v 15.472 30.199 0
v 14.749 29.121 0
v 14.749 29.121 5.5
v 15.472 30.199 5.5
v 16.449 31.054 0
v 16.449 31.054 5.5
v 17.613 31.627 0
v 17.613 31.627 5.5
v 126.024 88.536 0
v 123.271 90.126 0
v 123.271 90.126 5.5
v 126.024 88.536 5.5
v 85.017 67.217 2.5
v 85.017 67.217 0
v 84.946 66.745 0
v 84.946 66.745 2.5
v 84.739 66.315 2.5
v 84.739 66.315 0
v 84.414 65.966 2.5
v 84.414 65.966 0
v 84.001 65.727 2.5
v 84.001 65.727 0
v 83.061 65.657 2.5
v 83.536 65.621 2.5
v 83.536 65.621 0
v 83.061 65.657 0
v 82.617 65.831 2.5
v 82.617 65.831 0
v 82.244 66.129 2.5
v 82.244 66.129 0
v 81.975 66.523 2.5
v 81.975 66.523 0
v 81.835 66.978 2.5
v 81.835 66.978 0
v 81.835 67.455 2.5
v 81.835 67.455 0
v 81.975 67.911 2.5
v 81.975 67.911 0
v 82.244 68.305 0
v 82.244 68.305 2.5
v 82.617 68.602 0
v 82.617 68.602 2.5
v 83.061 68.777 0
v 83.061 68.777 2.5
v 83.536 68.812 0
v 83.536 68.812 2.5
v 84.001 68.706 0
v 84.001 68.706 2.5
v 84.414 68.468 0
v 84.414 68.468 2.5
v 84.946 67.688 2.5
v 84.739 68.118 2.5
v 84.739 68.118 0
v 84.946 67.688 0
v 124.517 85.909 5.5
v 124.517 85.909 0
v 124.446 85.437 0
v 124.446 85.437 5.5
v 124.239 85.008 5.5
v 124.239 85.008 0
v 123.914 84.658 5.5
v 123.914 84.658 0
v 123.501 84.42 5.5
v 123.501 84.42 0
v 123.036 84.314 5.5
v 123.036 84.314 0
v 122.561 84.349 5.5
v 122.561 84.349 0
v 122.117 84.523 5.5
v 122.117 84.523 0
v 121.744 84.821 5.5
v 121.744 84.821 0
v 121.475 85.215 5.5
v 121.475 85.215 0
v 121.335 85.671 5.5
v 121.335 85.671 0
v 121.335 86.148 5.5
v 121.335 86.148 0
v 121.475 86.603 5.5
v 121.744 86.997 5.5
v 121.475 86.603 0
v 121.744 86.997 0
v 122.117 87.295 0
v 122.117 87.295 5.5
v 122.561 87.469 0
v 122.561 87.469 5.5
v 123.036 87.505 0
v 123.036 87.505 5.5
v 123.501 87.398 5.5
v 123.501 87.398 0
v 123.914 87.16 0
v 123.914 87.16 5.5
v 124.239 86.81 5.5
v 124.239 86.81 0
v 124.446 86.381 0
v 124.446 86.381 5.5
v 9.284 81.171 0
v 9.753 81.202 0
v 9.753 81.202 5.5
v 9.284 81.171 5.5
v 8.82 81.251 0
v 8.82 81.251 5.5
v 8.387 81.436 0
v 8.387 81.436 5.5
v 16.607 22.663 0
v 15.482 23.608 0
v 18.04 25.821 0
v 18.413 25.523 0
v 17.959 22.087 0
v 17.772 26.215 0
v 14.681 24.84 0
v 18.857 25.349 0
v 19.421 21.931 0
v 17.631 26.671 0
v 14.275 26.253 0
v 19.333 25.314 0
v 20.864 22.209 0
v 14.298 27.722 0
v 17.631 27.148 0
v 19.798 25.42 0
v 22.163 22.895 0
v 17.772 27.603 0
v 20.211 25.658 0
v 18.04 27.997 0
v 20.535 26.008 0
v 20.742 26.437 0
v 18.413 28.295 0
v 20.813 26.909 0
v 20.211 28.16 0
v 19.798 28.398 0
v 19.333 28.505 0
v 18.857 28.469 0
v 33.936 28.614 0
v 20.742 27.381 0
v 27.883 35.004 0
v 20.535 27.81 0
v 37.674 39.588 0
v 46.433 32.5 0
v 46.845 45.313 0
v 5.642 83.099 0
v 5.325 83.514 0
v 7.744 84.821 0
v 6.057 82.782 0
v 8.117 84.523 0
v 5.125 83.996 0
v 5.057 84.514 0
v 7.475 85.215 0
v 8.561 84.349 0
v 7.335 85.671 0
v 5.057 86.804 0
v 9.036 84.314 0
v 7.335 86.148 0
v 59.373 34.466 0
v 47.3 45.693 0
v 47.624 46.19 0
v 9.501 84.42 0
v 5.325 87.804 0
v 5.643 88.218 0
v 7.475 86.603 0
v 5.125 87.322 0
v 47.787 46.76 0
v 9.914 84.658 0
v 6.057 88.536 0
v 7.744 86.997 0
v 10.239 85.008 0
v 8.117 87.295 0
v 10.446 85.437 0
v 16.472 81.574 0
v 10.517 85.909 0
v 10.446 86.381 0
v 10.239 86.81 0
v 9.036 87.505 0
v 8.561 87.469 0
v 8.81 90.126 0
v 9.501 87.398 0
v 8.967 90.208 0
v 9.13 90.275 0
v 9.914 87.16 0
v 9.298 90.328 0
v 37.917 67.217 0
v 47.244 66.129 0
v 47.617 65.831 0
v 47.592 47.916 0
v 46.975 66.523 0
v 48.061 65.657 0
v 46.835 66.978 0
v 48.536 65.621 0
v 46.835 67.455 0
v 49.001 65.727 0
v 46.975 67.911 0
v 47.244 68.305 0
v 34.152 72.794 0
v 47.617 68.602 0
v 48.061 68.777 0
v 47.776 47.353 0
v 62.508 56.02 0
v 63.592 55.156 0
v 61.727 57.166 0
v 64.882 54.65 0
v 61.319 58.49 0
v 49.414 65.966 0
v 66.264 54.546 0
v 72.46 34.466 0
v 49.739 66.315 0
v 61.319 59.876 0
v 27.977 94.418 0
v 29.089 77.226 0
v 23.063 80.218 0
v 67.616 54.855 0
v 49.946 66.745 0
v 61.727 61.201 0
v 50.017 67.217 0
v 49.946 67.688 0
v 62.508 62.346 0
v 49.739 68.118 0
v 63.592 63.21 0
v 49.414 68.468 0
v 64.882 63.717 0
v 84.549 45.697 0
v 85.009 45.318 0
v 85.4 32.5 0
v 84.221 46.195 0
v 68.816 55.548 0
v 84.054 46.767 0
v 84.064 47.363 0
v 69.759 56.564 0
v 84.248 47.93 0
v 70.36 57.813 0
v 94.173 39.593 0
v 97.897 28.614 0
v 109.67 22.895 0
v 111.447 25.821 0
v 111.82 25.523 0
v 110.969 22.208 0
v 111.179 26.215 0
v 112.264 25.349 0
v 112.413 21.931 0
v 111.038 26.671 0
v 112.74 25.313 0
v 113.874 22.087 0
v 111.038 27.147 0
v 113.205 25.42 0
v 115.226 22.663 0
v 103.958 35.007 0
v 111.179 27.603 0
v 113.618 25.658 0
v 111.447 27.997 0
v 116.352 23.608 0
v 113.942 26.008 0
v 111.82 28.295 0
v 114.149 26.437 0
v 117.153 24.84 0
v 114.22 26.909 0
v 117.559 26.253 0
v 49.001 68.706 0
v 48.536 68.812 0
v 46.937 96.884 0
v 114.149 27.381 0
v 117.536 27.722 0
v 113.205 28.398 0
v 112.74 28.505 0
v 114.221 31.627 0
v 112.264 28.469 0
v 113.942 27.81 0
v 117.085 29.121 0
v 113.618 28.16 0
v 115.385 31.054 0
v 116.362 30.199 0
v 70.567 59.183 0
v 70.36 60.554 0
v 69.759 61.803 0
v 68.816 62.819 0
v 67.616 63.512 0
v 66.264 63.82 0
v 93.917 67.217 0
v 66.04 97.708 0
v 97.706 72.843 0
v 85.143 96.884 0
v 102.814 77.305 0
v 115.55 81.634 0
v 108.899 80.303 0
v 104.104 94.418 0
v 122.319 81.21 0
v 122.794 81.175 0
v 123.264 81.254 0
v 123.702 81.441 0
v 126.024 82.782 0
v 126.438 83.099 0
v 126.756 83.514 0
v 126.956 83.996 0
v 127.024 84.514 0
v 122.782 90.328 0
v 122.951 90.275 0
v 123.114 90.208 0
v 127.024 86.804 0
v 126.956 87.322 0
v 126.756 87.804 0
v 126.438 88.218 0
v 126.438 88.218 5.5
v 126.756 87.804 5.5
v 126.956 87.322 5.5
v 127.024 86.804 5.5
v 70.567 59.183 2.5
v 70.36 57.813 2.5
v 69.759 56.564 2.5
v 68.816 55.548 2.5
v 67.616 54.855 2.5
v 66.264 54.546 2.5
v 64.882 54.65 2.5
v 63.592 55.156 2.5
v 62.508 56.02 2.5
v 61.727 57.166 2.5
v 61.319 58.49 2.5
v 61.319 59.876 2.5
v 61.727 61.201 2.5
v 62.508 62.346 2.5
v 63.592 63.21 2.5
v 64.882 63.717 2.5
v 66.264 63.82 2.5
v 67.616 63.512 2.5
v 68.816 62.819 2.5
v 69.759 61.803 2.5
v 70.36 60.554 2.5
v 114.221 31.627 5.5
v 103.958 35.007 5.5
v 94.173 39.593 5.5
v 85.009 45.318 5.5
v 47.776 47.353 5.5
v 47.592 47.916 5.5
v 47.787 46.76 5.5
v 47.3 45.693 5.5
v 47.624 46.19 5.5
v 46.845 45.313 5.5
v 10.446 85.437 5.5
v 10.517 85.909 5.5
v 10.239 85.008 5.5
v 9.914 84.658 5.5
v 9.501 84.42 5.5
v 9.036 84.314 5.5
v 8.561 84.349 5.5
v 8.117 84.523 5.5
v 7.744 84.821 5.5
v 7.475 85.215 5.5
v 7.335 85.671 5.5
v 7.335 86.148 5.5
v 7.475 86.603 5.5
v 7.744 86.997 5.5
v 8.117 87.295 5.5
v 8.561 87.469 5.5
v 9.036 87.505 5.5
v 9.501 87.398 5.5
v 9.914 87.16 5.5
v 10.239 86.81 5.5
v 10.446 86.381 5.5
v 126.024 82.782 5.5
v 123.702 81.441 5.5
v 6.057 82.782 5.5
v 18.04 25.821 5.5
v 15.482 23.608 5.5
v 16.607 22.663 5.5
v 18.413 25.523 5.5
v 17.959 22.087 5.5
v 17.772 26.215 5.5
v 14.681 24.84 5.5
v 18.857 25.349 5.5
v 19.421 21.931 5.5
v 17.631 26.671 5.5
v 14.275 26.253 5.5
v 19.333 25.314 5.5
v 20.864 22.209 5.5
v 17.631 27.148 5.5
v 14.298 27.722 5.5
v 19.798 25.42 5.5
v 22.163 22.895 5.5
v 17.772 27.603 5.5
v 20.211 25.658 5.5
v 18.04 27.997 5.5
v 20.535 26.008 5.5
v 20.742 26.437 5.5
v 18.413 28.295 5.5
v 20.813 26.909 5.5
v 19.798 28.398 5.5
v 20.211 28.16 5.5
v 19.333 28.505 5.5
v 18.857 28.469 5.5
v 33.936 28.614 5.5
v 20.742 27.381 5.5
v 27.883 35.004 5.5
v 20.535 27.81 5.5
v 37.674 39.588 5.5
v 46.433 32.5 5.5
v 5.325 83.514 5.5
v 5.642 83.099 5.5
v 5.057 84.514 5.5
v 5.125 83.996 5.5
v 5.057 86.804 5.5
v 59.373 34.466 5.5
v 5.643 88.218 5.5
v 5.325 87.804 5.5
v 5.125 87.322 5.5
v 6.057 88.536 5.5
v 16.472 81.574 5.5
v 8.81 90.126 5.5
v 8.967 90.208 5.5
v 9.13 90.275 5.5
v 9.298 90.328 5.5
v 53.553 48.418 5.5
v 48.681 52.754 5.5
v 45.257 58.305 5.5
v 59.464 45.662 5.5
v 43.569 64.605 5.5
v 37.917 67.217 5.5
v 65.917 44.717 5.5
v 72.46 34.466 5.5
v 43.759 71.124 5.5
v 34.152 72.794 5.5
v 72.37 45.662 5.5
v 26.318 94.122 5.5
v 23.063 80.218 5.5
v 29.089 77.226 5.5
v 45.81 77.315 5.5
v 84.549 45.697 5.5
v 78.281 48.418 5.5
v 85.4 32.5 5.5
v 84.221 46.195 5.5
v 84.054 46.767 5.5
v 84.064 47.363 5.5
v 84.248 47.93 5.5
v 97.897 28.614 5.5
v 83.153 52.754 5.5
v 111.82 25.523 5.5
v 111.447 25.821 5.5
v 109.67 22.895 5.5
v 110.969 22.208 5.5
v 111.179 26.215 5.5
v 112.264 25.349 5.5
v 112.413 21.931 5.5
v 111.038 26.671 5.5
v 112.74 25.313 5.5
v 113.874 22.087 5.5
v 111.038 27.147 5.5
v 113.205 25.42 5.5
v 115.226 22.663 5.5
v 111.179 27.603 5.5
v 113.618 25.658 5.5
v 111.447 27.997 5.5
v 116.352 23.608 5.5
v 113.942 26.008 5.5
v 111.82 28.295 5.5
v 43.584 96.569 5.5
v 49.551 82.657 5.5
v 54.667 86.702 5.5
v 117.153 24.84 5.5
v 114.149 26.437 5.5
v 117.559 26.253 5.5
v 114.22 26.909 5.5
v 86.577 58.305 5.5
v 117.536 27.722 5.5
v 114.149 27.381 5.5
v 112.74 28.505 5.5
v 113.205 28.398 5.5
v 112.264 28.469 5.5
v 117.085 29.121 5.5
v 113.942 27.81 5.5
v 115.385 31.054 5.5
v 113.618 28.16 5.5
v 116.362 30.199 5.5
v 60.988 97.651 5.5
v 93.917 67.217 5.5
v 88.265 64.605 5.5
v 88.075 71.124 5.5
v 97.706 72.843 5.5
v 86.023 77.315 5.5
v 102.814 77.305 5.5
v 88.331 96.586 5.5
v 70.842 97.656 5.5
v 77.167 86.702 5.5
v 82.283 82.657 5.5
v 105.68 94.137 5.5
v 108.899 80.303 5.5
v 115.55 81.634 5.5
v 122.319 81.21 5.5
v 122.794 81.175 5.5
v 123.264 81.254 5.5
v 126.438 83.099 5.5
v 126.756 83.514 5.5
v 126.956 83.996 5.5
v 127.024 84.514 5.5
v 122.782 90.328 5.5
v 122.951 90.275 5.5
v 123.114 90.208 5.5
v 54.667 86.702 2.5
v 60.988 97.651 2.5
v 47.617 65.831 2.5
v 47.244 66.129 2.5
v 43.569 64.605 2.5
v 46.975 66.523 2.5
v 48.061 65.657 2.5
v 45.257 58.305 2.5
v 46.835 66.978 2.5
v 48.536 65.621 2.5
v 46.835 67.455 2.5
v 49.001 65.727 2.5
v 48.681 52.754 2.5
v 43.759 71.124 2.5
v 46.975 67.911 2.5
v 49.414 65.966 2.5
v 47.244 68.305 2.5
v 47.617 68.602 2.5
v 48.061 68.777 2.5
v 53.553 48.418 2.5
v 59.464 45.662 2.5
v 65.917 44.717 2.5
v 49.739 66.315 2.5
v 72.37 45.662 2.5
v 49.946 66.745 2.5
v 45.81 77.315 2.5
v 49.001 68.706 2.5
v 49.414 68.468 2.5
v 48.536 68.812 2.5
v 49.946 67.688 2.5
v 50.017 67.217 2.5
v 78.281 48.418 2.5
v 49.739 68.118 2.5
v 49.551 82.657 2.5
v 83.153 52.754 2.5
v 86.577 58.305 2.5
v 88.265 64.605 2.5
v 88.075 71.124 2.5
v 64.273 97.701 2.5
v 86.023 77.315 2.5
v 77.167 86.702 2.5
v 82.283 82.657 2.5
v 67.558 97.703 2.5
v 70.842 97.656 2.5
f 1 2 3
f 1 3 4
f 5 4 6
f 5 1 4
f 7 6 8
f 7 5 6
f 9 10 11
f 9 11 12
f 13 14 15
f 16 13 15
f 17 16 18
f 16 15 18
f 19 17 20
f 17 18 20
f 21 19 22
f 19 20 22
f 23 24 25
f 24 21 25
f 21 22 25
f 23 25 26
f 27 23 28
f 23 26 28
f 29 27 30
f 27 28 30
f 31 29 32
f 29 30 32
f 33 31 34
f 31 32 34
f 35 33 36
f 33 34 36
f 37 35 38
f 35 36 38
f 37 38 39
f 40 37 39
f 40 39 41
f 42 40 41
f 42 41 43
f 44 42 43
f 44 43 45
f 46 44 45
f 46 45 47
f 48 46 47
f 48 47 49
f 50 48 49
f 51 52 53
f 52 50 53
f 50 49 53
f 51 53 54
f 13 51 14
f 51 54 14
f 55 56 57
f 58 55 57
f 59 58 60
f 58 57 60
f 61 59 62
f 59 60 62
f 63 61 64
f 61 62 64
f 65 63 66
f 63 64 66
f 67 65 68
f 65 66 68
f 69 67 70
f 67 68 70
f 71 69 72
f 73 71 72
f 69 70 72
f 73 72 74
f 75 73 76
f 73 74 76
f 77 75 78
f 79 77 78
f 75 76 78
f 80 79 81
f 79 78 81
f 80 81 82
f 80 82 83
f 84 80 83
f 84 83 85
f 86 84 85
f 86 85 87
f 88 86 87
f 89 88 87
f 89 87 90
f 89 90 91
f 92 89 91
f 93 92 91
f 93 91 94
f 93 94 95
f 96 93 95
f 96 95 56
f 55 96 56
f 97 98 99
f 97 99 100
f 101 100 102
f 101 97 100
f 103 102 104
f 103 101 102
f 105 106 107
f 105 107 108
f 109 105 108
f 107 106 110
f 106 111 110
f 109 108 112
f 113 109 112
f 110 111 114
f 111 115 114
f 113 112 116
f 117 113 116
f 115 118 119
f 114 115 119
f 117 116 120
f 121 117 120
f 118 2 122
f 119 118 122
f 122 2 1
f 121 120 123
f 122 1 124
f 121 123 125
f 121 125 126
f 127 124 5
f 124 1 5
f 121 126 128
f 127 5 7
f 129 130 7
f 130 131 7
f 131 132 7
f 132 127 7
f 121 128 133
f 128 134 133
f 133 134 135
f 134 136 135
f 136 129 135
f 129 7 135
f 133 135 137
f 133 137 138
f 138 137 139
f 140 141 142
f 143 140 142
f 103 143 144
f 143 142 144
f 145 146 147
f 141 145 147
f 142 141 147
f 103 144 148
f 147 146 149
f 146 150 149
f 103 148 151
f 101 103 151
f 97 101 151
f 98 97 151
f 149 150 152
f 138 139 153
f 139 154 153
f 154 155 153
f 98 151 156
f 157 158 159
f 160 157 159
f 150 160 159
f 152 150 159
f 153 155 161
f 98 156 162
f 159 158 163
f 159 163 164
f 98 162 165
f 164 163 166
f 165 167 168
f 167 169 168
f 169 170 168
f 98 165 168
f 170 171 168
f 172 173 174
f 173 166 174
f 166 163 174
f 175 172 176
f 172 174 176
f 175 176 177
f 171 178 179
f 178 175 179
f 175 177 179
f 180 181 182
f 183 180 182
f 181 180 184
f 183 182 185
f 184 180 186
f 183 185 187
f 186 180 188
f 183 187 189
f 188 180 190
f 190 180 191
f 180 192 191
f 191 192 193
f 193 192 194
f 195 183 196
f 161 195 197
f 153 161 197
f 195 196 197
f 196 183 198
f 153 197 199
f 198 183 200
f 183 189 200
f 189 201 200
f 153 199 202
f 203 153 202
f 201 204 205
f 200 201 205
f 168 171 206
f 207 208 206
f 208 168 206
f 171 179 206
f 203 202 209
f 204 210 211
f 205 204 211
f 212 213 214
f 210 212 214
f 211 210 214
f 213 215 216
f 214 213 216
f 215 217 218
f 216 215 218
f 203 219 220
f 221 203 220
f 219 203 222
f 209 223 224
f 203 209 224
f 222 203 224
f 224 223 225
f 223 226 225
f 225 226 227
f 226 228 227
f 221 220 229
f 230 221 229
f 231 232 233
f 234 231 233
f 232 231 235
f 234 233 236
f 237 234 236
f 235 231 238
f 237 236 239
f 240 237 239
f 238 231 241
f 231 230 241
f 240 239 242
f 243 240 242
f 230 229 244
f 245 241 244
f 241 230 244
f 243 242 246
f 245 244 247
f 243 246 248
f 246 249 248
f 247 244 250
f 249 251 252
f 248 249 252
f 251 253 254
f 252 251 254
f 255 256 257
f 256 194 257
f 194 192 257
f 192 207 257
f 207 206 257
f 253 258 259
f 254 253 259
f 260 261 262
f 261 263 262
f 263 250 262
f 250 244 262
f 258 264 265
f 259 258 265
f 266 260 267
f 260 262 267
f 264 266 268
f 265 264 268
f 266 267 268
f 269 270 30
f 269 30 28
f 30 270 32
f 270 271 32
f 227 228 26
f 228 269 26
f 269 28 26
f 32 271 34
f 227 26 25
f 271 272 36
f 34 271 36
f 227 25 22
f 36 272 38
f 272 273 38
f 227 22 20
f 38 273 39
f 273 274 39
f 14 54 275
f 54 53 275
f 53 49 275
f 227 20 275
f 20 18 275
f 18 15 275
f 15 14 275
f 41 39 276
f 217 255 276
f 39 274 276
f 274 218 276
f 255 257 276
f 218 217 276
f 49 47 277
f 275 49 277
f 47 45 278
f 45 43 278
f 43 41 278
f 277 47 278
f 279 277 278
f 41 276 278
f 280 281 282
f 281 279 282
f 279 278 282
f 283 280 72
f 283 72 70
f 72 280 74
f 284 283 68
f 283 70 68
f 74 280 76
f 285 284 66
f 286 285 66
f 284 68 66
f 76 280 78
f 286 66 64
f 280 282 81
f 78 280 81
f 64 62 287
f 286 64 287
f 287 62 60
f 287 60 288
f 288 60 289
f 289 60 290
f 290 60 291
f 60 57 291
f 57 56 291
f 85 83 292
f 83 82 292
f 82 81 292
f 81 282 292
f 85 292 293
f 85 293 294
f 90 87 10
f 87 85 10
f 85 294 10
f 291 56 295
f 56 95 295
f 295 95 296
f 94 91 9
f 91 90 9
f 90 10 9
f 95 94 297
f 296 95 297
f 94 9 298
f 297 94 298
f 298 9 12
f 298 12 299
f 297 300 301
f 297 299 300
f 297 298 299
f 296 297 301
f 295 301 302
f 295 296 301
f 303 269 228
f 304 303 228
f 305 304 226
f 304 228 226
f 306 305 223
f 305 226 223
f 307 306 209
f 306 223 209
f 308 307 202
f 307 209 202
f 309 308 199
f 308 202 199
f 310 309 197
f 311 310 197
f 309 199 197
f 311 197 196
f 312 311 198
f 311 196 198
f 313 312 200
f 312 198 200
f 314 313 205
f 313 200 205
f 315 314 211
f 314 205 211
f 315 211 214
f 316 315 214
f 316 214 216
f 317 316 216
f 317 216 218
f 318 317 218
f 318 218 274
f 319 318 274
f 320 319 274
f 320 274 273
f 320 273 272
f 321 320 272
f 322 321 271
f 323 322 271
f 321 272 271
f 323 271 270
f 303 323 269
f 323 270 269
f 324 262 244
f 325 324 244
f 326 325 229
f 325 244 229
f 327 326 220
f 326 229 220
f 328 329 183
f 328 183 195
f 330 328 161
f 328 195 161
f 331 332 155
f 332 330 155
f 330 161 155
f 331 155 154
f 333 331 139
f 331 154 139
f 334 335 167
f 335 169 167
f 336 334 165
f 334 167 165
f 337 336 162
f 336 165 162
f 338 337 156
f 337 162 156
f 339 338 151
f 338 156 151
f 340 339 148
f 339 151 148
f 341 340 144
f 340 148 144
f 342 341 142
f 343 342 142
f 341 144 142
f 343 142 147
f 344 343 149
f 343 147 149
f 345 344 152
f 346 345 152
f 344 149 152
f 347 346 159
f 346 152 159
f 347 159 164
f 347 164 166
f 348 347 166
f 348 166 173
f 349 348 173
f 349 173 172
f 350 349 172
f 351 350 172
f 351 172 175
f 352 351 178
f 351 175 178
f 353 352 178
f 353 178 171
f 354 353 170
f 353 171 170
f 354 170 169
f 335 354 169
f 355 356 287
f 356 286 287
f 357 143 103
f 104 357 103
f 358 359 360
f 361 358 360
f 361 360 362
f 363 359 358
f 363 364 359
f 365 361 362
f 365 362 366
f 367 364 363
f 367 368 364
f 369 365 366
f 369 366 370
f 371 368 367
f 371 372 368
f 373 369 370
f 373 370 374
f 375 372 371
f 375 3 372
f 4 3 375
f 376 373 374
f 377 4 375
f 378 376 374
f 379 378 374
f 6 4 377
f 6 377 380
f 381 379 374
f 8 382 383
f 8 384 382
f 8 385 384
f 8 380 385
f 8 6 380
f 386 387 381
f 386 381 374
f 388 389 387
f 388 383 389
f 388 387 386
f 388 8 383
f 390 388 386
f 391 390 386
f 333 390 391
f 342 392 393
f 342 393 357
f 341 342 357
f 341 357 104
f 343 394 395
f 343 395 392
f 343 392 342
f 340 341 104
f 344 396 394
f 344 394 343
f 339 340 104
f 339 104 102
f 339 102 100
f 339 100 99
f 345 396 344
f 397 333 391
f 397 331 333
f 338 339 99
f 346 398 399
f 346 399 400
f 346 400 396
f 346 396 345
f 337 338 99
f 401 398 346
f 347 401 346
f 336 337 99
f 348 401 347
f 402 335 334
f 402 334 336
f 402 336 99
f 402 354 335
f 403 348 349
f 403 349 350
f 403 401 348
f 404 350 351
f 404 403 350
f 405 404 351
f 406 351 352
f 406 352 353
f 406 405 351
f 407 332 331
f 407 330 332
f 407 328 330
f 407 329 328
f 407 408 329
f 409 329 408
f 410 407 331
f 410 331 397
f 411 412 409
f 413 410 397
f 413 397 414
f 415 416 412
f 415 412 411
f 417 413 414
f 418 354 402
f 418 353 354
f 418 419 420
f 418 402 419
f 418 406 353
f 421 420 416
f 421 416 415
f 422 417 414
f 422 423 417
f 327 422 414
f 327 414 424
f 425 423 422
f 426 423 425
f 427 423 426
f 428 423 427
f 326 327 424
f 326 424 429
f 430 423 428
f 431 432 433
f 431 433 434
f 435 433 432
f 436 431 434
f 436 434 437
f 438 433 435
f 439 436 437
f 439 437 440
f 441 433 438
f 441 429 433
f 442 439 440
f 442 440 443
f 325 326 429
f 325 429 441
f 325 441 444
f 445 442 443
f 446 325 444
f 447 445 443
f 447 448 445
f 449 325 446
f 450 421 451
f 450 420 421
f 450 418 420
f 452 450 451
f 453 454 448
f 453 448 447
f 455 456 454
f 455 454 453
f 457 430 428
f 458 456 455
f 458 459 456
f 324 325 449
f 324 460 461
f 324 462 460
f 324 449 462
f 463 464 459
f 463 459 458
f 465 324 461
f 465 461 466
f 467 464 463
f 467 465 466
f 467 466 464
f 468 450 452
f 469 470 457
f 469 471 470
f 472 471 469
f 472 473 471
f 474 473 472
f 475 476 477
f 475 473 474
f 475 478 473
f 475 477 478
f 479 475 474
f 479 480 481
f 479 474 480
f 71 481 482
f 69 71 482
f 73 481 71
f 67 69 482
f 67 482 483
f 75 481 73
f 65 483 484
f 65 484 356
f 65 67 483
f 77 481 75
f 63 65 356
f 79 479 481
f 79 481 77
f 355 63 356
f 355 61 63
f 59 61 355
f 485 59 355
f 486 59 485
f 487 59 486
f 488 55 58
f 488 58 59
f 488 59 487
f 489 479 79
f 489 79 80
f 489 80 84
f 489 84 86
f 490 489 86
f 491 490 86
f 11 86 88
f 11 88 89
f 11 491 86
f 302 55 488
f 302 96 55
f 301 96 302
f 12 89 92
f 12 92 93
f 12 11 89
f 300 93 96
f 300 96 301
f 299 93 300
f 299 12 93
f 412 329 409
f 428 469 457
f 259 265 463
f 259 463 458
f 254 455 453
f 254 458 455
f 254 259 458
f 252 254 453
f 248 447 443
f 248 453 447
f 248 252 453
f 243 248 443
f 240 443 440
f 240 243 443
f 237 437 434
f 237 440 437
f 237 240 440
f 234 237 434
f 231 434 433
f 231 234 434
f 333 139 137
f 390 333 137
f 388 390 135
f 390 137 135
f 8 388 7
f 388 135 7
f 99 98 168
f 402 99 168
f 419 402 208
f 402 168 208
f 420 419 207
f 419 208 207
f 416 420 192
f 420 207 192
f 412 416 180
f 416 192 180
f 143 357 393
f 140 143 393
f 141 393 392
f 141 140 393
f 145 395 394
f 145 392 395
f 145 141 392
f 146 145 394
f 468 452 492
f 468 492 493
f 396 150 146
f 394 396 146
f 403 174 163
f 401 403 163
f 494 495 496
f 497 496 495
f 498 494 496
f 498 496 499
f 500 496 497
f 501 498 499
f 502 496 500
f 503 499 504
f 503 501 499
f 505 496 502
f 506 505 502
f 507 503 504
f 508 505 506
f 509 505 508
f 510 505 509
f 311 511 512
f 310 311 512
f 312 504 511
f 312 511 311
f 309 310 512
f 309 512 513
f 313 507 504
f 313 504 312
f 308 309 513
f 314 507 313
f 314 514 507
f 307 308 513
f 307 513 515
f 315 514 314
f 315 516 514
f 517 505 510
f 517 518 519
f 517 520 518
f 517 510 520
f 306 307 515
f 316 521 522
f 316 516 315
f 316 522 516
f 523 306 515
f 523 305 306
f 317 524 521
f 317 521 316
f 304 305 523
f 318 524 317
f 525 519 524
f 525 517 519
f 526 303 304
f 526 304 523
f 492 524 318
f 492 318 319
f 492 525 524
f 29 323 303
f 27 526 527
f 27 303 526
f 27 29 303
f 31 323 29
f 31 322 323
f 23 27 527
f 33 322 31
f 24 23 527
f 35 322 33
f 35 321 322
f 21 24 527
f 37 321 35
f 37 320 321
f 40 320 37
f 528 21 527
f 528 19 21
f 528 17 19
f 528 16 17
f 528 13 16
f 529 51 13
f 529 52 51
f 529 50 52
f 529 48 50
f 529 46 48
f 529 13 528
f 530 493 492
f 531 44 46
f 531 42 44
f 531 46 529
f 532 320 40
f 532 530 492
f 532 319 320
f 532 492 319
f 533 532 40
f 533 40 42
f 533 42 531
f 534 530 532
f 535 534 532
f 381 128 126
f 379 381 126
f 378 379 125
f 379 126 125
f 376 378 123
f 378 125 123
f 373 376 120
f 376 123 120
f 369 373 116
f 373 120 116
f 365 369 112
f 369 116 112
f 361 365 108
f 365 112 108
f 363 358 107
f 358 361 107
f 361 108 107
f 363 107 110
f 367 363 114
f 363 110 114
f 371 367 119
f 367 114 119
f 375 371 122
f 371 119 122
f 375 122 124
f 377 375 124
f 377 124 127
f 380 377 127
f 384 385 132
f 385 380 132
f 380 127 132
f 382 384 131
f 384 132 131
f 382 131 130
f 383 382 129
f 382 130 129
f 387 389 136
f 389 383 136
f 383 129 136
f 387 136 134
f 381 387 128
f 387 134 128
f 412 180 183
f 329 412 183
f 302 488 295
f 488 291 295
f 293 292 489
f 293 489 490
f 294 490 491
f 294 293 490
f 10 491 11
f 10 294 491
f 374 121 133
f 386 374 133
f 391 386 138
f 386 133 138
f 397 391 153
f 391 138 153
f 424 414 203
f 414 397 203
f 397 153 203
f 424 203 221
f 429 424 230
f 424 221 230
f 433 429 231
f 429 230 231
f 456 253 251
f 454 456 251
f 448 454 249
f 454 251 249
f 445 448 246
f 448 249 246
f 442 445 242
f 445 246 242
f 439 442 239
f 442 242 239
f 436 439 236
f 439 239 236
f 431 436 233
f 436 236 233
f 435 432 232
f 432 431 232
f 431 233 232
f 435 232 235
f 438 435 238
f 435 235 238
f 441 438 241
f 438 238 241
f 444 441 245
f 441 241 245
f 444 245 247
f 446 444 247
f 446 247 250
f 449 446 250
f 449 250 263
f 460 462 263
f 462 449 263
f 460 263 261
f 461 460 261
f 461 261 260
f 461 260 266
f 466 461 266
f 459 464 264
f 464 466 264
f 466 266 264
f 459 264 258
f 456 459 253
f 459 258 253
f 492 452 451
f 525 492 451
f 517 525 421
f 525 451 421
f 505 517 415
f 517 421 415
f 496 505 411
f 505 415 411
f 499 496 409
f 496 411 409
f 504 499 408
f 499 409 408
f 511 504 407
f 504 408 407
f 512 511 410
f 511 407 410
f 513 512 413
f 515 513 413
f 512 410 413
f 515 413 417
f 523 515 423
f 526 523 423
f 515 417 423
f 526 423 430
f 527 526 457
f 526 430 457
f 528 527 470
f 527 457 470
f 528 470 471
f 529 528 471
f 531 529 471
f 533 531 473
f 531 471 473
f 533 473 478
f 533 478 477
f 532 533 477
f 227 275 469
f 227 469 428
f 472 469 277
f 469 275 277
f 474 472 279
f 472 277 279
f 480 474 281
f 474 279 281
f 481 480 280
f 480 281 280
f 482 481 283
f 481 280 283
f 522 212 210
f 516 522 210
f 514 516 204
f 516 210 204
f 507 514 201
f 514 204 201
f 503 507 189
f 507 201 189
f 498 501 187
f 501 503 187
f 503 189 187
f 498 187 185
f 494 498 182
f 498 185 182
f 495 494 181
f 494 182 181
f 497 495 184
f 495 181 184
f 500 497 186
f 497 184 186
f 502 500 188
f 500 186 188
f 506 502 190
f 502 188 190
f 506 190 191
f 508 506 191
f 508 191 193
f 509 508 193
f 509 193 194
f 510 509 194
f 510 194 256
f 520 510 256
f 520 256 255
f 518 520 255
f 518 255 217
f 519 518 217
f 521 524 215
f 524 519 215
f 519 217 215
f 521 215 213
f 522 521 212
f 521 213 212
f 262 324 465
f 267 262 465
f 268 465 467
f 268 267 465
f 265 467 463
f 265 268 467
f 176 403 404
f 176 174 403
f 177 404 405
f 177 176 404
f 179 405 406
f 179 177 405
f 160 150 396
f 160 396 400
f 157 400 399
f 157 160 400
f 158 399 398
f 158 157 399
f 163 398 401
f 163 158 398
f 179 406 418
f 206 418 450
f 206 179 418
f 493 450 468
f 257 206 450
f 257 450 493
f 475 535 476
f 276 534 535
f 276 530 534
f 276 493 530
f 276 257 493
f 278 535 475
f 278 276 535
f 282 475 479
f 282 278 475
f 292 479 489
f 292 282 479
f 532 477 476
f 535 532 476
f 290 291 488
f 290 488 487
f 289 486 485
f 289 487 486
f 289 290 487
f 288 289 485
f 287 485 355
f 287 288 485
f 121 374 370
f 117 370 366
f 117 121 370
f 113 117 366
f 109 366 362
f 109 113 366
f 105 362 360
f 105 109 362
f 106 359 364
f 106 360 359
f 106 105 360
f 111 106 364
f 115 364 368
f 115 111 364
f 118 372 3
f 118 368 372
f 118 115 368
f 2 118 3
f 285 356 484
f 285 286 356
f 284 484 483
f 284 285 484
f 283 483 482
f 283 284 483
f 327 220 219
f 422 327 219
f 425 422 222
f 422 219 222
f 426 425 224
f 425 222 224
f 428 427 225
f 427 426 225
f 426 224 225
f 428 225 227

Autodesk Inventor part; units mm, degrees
ref_plane "YZ Plane" through (0, 0, 0) normal (1, 0, 0) x (0, 1, 0)
ref_plane "XZ Plane" through (0, 0, 0) normal (0, 1, 0) x (-1, 0, 0)
ref_plane "XY Plane" through (0, 0, 0) normal (0, 0, 1) x (1, 0, 0)
sketch "スケッチ1" plane through (0, 0, 0) normal (0, 0, 1) x (1, 0, 0)
  circle A0 centre (19.2131, 26.9091) radius 1.6
  circle A1 centre (8.9167, 85.9091) radius 1.6
  circle A2 centre (122.9167, 85.9091) radius 1.6
  circle A3 centre (112.6203, 26.909) radius 1.6
  line L0 (65.9168, 92.271) -> (65.9166, 46.271)
  line L1 (7.2067, 85.9091) -> (10.6267, 85.9091)
  line L2 (8.9167, 84.1991) -> (8.9167, 87.6191)
  line L3 (124.6267, 85.9091) -> (121.2067, 85.9091)
  line L4 (122.9167, 84.1991) -> (122.9167, 87.6191)
  line L5 (6.0567, 82.7816) -> (8.3869, 81.4363)
  line L6 (5.0567, 86.8043) -> (5.0567, 84.5137)
  line L7 (123.7023, 81.4412) -> (126.0241, 82.7816)
  circle A4 centre (65.9167, 59.1833) radius 4.65
  circle A5 centre (65.9167, 67.1833) radius 14
  line L8 (82.734, 67.2168) -> (82.7592, 67.2168)
  circle A6 centre (48.4167, 67.2168) radius 1.6
  circle A7 centre (83.4167, 67.2168) radius 1.6
  arc A8 (37.9167, 67.2167) -> (9.7534, 81.2022) centre (14.5444, 55.5004) ccw
  arc A9 (122.3194, 81.2102) -> (93.9167, 67.2168) centre (117.3134, 55.5494) ccw
  line L9 (37.9167, 67.2167) -> (47.5918, 47.9164)
  line L10 (93.9167, 67.2168) -> (84.2485, 47.9303)
  arc A10 (46.8453, 45.3126) -> (47.5918, 47.9164) centre (45.8039, 47.0201) ccw
  arc A11 (84.2485, 47.9303) -> (85.0094, 45.3179) centre (86.0364, 47.034) ccw
  circle A12 centre (19.2131, 26.9091) radius 1.6
  circle A13 centre (112.6203, 26.909) radius 1.6
  circle A14 centre (122.9167, 85.9091) radius 1.6
  circle A15 centre (8.9167, 85.9091) radius 1.6
  arc A16 (122.7823, 90.3275) -> (9.2985, 90.3275) centre (66.0404, -124.0864) ccw
  arc A17 (123.2706, 90.1261) -> (122.7823, 90.3275) centre (122.2706, 88.394) ccw
  arc A18 (126.0241, 82.7816) -> (127.0241, 84.5137) centre (125.0241, 84.5137) ccw
  arc A19 (122.3194, 81.2102) -> (123.7023, 81.4412) centre (122.7023, 83.1732) ccw
  arc A20 (9.2985, 90.3275) -> (8.8102, 90.1261) centre (9.8102, 88.394) ccw
  arc A21 (8.3869, 81.4363) -> (9.7534, 81.2022) centre (9.3869, 83.1683) ccw
  arc A22 (6.0567, 88.5363) -> (5.0567, 86.8043) centre (7.0567, 86.8043) ccw
  arc A23 (5.0567, 84.5137) -> (6.0567, 82.7816) centre (7.0567, 84.5137) ccw
  line L11 (8.8102, 90.1261) -> (6.0567, 88.5363)
  line L12 (123.2706, 90.1261) -> (126.0241, 88.5363)
  line L13 (127.0241, 84.5137) -> (127.0241, 86.8043)
  arc A24 (127.0241, 86.8043) -> (126.0241, 88.5363) centre (125.0241, 86.8043) ccw
  arc A25 (14.749, 29.1208) -> (22.1634, 22.8946) centre (19.2131, 26.9091) ccw
  arc A26 (109.6696, 22.8946) -> (117.0846, 29.1208) centre (112.6203, 26.909) ccw
  arc A27 (109.6696, 22.8946) -> (22.1634, 22.8946) centre (65.9165, -52.1885) ccw
  arc A28 (18.2456, 31.7962) -> (22.1634, 22.8946) centre (19.2131, 26.9091) ccw
  arc A29 (109.6696, 22.8946) -> (113.5922, 31.7955) centre (112.6203, 26.909) ccw
  arc A30 (17.6131, 31.6271) -> (46.8453, 45.3126) centre (-5.3123, 118.6583) ccw
  arc A31 (85.0094, 45.3179) -> (114.2208, 31.6271) centre (137.191, 118.6465) ccw
  point P0 (0, 0)
  dimension "d10" = 28
  dimension "d13" = 17.5
  dimension "d15" = 17.5
  dimension "d20" = 3.2
  dimension "d27" = 2.681
  dimension "d28" = 2.2906
  dimension "d29" = 2
  dimension "d31" = 2.2906
  dimension "d35" = 46.7037
  dimension "d36" = 46.7035
  dimension "d39" = 90
  dimension "d40" = 90
extrude "押し出し1" add sketch "スケッチ1" along normal blind 5.5 contours A5 L0 A4 | L0 A4 A5 | A23 L6 A22 L11 A20 A16 A17 L12 A24 L13 A18 L7 A19 A9 L10 A11 A31 A29 A26 A27 A25 A28 A30 A10 L9 A8 A21 L5
sketch "スケッチ3" plane through (0, 0, 5.5) normal (0, 0, 1) x (1, 0, 0)
  circle A0 centre (48.4167, 67.2168) radius 1.6 projected
  circle A1 centre (83.4167, 67.2168) radius 1.6 projected
  arc A2 (54.6667, 86.7024) -> (77.1667, 86.7024) centre (65.9167, 67.2168) ccw
  line L0 (54.6667, 86.7024) -> (60.9878, 97.6509)
  arc A3 (122.7823, 90.3275) -> (9.2985, 90.3275) centre (66.0404, -124.0864) ccw projected
  line L1 (77.1667, 86.7024) -> (70.8424, 97.6564)
  arc A4 (70.8424, 97.6564) -> (60.9878, 97.6509) centre (66.0404, -124.0864) ccw
  line L2 (60.9878, 97.6509) -> (54.6667, 86.7024)
  arc A5 (70.8424, 97.6564) -> (60.9878, 97.6509) centre (66.0404, -124.0864) ccw
  line L3 (70.8424, 97.6564) -> (77.1667, 86.7024)
  point P0 (0, 0)
extrude "押し出し2" cut sketch "スケッチ3" against normal blind 3
properties part number "ステッピング固定具" material "MDF 中密度繊維ボード"
